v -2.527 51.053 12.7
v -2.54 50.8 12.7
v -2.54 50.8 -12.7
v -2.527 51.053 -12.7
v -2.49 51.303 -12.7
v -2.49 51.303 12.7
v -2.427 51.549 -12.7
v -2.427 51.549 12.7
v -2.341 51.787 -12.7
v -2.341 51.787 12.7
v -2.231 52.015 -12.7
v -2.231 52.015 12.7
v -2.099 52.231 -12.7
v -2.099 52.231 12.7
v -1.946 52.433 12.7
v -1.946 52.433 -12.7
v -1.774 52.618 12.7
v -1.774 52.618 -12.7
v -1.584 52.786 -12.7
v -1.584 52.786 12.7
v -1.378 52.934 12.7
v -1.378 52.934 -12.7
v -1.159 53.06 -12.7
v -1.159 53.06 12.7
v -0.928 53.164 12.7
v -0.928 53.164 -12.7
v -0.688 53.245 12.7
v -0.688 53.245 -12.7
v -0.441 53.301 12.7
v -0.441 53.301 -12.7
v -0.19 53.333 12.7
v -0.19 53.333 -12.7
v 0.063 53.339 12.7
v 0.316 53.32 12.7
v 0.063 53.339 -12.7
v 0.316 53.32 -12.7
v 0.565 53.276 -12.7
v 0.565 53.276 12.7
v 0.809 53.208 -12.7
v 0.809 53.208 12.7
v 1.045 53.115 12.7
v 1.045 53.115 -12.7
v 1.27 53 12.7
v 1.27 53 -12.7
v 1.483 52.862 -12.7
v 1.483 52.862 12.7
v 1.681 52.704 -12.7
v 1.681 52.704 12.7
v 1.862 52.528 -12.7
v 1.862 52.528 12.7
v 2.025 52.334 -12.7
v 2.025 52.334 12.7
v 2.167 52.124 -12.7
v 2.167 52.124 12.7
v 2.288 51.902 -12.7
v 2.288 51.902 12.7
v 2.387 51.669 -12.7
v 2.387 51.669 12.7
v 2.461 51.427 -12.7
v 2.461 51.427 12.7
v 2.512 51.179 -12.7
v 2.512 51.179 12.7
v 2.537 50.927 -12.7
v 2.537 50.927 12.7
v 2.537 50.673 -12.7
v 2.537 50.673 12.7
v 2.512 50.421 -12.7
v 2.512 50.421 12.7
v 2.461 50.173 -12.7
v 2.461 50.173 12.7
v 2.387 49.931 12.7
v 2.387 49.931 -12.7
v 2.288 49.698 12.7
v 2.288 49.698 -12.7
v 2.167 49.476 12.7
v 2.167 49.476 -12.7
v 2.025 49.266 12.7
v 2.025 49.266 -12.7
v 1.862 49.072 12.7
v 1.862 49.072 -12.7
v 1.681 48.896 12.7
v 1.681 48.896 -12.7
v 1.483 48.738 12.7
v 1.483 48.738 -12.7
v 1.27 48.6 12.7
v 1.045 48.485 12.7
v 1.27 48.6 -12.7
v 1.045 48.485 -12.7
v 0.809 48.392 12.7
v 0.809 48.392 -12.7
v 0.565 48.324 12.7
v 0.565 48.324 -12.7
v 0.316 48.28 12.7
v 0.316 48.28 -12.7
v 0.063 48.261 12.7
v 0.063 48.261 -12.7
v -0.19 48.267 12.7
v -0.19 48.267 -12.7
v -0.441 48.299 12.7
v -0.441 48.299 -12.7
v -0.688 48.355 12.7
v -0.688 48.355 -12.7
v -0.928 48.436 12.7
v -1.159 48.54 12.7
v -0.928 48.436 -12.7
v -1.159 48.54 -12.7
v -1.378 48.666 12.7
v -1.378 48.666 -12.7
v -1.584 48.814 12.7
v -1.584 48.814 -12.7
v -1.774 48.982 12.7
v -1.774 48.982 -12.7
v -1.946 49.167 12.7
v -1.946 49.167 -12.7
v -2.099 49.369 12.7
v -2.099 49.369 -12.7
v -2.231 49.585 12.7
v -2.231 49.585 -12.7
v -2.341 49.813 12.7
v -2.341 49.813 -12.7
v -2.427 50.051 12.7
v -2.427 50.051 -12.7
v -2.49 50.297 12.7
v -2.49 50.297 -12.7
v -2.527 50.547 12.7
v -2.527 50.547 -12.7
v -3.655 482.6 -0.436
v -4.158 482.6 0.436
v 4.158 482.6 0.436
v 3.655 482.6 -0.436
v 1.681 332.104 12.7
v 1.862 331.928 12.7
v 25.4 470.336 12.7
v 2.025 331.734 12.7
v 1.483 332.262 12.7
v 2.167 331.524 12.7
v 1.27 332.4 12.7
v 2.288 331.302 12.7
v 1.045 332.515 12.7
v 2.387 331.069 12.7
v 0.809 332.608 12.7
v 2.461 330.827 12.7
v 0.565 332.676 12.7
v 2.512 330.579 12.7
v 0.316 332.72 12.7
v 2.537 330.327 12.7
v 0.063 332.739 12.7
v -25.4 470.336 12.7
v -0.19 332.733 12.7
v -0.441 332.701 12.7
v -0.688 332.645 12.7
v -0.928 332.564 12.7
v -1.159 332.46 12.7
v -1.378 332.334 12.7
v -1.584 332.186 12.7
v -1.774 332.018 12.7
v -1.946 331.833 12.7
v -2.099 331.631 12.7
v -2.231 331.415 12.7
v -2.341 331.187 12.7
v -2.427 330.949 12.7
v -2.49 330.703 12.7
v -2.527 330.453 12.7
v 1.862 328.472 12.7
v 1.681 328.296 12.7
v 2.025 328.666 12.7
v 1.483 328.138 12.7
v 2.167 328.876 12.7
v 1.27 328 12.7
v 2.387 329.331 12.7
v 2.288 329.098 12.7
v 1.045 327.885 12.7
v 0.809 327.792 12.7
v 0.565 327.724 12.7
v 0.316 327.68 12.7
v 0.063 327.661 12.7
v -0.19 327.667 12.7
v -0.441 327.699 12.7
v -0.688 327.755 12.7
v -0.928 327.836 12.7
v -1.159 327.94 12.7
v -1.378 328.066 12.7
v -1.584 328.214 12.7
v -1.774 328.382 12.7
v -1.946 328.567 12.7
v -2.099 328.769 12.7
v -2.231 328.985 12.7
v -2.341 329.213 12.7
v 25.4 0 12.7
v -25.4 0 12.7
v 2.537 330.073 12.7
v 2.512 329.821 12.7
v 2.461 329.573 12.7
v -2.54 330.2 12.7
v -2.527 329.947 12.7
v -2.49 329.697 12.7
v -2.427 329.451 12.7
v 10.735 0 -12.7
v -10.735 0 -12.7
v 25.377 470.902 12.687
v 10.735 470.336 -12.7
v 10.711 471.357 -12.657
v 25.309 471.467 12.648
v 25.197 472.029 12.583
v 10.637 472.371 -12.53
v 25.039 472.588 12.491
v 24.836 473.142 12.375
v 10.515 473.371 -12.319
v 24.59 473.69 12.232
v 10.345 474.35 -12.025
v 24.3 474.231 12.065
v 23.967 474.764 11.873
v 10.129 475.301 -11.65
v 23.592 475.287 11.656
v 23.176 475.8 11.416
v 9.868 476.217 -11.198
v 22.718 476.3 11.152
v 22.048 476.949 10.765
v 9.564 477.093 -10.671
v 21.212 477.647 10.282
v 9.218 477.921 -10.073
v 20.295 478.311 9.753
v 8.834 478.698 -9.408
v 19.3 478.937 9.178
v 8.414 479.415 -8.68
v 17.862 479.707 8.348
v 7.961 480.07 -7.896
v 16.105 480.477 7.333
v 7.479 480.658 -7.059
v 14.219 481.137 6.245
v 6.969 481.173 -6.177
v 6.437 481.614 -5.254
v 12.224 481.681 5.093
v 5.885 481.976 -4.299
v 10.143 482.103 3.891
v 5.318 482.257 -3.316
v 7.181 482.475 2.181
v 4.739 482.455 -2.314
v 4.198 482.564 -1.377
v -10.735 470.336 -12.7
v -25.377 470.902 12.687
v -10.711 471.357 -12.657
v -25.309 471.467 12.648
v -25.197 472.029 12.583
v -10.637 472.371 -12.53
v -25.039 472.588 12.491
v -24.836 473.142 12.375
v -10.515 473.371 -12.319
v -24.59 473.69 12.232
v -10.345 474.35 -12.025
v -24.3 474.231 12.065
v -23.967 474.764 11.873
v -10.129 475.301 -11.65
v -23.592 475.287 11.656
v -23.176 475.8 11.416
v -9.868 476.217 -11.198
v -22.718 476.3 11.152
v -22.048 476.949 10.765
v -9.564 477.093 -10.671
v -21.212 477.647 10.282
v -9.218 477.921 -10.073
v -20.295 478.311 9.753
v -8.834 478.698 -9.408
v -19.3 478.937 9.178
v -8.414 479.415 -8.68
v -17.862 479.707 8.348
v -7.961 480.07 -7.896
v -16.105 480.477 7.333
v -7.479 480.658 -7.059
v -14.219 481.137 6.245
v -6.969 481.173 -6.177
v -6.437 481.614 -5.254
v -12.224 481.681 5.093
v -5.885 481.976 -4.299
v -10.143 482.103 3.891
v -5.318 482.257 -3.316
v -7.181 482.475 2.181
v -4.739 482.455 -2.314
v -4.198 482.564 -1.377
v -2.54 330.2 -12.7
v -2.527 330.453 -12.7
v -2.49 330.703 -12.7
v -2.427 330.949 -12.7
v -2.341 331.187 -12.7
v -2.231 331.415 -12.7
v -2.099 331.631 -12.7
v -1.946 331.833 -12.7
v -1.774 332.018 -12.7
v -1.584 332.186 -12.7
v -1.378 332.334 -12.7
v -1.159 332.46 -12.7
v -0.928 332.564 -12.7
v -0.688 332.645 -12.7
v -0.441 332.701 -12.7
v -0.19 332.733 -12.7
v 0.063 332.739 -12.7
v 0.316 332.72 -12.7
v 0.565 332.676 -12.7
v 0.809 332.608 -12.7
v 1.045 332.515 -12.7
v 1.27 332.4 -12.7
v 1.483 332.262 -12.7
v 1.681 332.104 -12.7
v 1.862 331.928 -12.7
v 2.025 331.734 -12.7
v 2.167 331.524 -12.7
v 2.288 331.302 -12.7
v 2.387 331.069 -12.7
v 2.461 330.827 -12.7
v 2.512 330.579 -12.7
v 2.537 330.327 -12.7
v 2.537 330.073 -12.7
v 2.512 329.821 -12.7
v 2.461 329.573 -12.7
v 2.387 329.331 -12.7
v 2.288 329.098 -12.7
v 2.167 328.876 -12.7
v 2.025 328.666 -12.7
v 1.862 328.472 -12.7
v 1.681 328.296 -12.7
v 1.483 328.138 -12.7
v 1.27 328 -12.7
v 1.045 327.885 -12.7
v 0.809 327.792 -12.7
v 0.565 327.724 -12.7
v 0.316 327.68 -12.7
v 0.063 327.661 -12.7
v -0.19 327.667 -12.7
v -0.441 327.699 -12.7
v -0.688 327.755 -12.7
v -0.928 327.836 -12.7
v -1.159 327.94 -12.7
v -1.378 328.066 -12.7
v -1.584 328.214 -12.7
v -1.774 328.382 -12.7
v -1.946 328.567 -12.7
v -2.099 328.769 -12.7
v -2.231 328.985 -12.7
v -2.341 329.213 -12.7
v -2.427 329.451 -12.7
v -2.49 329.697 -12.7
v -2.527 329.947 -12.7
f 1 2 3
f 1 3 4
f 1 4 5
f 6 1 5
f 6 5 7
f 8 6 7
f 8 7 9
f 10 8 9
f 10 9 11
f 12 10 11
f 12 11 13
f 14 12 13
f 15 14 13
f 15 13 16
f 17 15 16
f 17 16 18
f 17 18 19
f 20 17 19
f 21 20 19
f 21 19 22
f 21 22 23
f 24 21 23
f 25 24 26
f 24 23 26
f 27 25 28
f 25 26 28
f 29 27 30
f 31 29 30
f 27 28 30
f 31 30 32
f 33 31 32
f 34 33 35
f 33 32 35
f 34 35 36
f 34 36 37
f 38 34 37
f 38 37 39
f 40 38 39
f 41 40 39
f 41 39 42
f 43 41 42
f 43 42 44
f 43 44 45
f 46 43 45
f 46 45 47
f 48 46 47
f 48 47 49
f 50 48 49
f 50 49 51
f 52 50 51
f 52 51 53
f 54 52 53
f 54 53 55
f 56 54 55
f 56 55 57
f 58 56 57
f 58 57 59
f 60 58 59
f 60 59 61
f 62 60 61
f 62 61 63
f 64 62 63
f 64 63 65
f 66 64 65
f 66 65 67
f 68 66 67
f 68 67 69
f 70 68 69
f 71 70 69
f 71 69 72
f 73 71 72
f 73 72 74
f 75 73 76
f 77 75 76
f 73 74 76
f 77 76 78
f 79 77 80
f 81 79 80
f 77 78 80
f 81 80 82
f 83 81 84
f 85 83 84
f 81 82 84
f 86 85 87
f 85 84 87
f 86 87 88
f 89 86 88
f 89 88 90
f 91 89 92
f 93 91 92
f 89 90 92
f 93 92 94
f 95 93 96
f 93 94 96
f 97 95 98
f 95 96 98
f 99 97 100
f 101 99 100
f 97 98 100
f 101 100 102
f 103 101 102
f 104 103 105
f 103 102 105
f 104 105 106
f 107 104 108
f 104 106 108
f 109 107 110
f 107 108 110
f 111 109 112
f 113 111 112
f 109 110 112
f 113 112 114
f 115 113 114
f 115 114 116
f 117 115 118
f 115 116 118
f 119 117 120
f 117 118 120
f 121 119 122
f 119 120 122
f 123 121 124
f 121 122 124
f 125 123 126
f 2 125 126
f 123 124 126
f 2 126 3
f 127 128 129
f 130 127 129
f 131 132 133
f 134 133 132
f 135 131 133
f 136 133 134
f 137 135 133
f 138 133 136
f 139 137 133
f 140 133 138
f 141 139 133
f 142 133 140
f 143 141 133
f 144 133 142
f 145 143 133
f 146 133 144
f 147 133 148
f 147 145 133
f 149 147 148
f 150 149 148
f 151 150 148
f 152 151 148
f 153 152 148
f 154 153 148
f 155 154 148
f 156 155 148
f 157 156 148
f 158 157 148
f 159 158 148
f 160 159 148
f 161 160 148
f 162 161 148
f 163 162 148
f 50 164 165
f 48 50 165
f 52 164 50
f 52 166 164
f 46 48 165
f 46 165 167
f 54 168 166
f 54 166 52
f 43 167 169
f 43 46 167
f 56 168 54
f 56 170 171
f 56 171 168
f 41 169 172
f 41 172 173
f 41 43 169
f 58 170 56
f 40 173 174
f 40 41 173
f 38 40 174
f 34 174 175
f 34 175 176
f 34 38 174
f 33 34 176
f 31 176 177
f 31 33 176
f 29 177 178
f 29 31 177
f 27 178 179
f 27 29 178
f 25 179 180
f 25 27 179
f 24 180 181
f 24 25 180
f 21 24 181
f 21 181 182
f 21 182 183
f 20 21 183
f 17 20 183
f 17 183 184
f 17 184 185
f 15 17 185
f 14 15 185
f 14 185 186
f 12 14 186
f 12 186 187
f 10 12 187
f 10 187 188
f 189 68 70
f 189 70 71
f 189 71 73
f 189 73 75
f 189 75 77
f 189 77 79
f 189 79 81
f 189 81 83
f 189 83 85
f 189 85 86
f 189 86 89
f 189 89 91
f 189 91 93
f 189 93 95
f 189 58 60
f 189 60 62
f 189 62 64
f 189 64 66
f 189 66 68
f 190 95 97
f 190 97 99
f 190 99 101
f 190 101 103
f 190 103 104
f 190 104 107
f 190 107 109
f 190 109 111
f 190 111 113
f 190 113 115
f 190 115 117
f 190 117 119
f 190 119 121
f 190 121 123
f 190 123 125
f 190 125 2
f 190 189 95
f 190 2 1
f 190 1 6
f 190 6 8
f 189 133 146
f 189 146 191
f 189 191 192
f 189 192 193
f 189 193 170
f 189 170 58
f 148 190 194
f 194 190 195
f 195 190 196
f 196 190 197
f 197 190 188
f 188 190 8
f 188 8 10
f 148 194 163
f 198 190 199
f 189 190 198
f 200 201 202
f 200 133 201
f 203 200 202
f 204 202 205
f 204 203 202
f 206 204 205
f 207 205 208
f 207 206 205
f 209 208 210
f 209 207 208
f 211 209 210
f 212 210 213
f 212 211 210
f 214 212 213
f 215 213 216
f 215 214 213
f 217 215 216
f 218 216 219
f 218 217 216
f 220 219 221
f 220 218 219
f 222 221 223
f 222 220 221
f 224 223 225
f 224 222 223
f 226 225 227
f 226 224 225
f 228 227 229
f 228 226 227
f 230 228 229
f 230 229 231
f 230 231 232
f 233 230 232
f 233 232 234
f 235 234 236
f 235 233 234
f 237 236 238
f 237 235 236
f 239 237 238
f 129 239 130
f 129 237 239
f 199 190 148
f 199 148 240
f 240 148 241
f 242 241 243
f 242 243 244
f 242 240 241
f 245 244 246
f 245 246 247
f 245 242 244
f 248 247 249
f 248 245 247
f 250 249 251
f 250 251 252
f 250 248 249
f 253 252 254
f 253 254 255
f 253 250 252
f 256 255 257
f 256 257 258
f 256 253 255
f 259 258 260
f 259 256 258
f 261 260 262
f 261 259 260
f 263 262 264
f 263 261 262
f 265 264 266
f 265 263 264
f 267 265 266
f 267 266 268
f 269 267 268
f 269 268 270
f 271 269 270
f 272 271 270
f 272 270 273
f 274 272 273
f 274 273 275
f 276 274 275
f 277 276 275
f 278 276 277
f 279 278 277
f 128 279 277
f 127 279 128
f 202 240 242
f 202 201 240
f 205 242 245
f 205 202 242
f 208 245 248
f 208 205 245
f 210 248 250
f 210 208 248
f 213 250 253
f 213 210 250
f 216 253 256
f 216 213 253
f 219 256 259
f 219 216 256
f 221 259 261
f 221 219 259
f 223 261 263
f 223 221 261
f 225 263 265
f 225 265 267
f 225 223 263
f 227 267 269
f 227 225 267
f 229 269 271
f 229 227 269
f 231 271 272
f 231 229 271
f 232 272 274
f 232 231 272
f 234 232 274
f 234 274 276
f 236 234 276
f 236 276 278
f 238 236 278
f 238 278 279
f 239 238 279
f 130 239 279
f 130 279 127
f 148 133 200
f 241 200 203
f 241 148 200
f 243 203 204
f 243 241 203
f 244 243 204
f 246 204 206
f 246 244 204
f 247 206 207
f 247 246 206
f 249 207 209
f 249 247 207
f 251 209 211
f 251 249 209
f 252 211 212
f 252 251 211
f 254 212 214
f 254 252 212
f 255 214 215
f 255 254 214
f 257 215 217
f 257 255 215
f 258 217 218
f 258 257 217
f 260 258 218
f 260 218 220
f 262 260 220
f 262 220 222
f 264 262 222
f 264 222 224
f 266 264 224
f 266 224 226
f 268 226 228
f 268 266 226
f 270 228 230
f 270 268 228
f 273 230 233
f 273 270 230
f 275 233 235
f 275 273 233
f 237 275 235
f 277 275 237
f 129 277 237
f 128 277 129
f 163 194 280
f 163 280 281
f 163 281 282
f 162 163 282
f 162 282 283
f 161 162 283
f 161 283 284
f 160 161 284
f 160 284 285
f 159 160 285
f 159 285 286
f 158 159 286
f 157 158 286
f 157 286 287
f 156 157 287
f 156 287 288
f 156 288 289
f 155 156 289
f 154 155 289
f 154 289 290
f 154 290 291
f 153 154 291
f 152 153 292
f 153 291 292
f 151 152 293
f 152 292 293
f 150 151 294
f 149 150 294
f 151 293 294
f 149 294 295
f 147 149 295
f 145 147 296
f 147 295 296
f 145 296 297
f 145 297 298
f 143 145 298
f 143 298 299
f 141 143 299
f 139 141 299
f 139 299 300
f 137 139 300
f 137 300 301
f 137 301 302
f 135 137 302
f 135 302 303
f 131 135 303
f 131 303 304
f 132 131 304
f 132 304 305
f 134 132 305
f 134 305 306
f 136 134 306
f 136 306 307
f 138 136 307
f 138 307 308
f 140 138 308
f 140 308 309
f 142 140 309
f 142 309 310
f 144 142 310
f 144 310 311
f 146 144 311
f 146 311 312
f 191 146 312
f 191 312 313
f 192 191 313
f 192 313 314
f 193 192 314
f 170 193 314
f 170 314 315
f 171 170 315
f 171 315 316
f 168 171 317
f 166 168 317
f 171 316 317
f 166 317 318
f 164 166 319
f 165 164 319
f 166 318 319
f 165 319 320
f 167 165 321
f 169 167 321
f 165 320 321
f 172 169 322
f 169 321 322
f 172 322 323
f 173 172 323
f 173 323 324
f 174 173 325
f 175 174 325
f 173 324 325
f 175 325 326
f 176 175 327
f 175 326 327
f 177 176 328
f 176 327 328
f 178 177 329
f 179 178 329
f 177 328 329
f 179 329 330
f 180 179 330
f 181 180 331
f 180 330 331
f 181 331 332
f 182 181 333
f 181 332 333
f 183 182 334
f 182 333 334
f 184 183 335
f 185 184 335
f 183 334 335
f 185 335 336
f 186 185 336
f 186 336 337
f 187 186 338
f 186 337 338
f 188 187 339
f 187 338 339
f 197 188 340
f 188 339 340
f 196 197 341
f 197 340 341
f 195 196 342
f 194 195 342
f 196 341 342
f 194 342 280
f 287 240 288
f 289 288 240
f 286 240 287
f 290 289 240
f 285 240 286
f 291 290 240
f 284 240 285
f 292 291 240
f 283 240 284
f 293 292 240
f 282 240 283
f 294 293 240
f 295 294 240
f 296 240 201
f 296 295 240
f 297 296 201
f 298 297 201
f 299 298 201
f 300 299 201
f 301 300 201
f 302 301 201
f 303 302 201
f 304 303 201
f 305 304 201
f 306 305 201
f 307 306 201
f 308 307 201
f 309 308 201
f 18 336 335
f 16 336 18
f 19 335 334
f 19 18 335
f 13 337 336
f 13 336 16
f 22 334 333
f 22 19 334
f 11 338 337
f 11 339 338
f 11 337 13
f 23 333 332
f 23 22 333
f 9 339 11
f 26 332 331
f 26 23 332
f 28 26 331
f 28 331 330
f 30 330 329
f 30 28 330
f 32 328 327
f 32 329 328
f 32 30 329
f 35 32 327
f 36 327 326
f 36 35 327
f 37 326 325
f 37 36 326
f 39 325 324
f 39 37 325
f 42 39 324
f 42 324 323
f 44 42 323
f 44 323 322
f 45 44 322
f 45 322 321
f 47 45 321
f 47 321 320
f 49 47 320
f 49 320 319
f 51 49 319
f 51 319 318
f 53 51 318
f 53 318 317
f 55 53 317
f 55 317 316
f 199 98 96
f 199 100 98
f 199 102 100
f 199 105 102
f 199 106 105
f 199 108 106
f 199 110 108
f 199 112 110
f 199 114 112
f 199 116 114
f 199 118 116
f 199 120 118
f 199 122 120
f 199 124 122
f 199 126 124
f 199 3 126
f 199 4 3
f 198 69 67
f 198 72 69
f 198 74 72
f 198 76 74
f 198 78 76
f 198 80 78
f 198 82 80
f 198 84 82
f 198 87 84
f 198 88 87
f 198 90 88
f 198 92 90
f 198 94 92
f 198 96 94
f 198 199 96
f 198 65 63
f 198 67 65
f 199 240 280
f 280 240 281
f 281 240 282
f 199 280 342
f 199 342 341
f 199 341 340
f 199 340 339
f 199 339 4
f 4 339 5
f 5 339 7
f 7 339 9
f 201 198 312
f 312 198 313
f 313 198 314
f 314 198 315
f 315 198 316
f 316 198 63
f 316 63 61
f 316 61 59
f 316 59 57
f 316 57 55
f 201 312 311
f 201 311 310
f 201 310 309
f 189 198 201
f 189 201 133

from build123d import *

# Parameters (mm, degrees)
F1_DEPTH = 482.6
F2_R     = 12.2642048969
F5_D     = 5.08


with BuildPart() as f1:
    # F0 (on Front) → F1 (new body)
    with BuildSketch(Plane.XZ):
        Polygon((25.4, 12.7), (-25.4, 12.7), (-10.7353031626, -12.7), (10.7353031626, -12.7), align=None)
    extrude(amount=-F1_DEPTH)

    # F2
    f2_edges = [f1.edges().sort_by_distance(p)[0] for p in [
        (0, 482.6, 12.7),
        (18.067652, 482.6, 0),
        (0, 482.6, -12.7),
        (-18.067652, 482.6, 0),
    ]]
    fillet(f2_edges, radius=F2_R)

    # F5 (through all)
    with Locations(Plane.XY.offset(12.7)):
        with Locations((0, 330.2), (0, 50.8)):
            Hole(F5_D / 2)


solid = f1.part
